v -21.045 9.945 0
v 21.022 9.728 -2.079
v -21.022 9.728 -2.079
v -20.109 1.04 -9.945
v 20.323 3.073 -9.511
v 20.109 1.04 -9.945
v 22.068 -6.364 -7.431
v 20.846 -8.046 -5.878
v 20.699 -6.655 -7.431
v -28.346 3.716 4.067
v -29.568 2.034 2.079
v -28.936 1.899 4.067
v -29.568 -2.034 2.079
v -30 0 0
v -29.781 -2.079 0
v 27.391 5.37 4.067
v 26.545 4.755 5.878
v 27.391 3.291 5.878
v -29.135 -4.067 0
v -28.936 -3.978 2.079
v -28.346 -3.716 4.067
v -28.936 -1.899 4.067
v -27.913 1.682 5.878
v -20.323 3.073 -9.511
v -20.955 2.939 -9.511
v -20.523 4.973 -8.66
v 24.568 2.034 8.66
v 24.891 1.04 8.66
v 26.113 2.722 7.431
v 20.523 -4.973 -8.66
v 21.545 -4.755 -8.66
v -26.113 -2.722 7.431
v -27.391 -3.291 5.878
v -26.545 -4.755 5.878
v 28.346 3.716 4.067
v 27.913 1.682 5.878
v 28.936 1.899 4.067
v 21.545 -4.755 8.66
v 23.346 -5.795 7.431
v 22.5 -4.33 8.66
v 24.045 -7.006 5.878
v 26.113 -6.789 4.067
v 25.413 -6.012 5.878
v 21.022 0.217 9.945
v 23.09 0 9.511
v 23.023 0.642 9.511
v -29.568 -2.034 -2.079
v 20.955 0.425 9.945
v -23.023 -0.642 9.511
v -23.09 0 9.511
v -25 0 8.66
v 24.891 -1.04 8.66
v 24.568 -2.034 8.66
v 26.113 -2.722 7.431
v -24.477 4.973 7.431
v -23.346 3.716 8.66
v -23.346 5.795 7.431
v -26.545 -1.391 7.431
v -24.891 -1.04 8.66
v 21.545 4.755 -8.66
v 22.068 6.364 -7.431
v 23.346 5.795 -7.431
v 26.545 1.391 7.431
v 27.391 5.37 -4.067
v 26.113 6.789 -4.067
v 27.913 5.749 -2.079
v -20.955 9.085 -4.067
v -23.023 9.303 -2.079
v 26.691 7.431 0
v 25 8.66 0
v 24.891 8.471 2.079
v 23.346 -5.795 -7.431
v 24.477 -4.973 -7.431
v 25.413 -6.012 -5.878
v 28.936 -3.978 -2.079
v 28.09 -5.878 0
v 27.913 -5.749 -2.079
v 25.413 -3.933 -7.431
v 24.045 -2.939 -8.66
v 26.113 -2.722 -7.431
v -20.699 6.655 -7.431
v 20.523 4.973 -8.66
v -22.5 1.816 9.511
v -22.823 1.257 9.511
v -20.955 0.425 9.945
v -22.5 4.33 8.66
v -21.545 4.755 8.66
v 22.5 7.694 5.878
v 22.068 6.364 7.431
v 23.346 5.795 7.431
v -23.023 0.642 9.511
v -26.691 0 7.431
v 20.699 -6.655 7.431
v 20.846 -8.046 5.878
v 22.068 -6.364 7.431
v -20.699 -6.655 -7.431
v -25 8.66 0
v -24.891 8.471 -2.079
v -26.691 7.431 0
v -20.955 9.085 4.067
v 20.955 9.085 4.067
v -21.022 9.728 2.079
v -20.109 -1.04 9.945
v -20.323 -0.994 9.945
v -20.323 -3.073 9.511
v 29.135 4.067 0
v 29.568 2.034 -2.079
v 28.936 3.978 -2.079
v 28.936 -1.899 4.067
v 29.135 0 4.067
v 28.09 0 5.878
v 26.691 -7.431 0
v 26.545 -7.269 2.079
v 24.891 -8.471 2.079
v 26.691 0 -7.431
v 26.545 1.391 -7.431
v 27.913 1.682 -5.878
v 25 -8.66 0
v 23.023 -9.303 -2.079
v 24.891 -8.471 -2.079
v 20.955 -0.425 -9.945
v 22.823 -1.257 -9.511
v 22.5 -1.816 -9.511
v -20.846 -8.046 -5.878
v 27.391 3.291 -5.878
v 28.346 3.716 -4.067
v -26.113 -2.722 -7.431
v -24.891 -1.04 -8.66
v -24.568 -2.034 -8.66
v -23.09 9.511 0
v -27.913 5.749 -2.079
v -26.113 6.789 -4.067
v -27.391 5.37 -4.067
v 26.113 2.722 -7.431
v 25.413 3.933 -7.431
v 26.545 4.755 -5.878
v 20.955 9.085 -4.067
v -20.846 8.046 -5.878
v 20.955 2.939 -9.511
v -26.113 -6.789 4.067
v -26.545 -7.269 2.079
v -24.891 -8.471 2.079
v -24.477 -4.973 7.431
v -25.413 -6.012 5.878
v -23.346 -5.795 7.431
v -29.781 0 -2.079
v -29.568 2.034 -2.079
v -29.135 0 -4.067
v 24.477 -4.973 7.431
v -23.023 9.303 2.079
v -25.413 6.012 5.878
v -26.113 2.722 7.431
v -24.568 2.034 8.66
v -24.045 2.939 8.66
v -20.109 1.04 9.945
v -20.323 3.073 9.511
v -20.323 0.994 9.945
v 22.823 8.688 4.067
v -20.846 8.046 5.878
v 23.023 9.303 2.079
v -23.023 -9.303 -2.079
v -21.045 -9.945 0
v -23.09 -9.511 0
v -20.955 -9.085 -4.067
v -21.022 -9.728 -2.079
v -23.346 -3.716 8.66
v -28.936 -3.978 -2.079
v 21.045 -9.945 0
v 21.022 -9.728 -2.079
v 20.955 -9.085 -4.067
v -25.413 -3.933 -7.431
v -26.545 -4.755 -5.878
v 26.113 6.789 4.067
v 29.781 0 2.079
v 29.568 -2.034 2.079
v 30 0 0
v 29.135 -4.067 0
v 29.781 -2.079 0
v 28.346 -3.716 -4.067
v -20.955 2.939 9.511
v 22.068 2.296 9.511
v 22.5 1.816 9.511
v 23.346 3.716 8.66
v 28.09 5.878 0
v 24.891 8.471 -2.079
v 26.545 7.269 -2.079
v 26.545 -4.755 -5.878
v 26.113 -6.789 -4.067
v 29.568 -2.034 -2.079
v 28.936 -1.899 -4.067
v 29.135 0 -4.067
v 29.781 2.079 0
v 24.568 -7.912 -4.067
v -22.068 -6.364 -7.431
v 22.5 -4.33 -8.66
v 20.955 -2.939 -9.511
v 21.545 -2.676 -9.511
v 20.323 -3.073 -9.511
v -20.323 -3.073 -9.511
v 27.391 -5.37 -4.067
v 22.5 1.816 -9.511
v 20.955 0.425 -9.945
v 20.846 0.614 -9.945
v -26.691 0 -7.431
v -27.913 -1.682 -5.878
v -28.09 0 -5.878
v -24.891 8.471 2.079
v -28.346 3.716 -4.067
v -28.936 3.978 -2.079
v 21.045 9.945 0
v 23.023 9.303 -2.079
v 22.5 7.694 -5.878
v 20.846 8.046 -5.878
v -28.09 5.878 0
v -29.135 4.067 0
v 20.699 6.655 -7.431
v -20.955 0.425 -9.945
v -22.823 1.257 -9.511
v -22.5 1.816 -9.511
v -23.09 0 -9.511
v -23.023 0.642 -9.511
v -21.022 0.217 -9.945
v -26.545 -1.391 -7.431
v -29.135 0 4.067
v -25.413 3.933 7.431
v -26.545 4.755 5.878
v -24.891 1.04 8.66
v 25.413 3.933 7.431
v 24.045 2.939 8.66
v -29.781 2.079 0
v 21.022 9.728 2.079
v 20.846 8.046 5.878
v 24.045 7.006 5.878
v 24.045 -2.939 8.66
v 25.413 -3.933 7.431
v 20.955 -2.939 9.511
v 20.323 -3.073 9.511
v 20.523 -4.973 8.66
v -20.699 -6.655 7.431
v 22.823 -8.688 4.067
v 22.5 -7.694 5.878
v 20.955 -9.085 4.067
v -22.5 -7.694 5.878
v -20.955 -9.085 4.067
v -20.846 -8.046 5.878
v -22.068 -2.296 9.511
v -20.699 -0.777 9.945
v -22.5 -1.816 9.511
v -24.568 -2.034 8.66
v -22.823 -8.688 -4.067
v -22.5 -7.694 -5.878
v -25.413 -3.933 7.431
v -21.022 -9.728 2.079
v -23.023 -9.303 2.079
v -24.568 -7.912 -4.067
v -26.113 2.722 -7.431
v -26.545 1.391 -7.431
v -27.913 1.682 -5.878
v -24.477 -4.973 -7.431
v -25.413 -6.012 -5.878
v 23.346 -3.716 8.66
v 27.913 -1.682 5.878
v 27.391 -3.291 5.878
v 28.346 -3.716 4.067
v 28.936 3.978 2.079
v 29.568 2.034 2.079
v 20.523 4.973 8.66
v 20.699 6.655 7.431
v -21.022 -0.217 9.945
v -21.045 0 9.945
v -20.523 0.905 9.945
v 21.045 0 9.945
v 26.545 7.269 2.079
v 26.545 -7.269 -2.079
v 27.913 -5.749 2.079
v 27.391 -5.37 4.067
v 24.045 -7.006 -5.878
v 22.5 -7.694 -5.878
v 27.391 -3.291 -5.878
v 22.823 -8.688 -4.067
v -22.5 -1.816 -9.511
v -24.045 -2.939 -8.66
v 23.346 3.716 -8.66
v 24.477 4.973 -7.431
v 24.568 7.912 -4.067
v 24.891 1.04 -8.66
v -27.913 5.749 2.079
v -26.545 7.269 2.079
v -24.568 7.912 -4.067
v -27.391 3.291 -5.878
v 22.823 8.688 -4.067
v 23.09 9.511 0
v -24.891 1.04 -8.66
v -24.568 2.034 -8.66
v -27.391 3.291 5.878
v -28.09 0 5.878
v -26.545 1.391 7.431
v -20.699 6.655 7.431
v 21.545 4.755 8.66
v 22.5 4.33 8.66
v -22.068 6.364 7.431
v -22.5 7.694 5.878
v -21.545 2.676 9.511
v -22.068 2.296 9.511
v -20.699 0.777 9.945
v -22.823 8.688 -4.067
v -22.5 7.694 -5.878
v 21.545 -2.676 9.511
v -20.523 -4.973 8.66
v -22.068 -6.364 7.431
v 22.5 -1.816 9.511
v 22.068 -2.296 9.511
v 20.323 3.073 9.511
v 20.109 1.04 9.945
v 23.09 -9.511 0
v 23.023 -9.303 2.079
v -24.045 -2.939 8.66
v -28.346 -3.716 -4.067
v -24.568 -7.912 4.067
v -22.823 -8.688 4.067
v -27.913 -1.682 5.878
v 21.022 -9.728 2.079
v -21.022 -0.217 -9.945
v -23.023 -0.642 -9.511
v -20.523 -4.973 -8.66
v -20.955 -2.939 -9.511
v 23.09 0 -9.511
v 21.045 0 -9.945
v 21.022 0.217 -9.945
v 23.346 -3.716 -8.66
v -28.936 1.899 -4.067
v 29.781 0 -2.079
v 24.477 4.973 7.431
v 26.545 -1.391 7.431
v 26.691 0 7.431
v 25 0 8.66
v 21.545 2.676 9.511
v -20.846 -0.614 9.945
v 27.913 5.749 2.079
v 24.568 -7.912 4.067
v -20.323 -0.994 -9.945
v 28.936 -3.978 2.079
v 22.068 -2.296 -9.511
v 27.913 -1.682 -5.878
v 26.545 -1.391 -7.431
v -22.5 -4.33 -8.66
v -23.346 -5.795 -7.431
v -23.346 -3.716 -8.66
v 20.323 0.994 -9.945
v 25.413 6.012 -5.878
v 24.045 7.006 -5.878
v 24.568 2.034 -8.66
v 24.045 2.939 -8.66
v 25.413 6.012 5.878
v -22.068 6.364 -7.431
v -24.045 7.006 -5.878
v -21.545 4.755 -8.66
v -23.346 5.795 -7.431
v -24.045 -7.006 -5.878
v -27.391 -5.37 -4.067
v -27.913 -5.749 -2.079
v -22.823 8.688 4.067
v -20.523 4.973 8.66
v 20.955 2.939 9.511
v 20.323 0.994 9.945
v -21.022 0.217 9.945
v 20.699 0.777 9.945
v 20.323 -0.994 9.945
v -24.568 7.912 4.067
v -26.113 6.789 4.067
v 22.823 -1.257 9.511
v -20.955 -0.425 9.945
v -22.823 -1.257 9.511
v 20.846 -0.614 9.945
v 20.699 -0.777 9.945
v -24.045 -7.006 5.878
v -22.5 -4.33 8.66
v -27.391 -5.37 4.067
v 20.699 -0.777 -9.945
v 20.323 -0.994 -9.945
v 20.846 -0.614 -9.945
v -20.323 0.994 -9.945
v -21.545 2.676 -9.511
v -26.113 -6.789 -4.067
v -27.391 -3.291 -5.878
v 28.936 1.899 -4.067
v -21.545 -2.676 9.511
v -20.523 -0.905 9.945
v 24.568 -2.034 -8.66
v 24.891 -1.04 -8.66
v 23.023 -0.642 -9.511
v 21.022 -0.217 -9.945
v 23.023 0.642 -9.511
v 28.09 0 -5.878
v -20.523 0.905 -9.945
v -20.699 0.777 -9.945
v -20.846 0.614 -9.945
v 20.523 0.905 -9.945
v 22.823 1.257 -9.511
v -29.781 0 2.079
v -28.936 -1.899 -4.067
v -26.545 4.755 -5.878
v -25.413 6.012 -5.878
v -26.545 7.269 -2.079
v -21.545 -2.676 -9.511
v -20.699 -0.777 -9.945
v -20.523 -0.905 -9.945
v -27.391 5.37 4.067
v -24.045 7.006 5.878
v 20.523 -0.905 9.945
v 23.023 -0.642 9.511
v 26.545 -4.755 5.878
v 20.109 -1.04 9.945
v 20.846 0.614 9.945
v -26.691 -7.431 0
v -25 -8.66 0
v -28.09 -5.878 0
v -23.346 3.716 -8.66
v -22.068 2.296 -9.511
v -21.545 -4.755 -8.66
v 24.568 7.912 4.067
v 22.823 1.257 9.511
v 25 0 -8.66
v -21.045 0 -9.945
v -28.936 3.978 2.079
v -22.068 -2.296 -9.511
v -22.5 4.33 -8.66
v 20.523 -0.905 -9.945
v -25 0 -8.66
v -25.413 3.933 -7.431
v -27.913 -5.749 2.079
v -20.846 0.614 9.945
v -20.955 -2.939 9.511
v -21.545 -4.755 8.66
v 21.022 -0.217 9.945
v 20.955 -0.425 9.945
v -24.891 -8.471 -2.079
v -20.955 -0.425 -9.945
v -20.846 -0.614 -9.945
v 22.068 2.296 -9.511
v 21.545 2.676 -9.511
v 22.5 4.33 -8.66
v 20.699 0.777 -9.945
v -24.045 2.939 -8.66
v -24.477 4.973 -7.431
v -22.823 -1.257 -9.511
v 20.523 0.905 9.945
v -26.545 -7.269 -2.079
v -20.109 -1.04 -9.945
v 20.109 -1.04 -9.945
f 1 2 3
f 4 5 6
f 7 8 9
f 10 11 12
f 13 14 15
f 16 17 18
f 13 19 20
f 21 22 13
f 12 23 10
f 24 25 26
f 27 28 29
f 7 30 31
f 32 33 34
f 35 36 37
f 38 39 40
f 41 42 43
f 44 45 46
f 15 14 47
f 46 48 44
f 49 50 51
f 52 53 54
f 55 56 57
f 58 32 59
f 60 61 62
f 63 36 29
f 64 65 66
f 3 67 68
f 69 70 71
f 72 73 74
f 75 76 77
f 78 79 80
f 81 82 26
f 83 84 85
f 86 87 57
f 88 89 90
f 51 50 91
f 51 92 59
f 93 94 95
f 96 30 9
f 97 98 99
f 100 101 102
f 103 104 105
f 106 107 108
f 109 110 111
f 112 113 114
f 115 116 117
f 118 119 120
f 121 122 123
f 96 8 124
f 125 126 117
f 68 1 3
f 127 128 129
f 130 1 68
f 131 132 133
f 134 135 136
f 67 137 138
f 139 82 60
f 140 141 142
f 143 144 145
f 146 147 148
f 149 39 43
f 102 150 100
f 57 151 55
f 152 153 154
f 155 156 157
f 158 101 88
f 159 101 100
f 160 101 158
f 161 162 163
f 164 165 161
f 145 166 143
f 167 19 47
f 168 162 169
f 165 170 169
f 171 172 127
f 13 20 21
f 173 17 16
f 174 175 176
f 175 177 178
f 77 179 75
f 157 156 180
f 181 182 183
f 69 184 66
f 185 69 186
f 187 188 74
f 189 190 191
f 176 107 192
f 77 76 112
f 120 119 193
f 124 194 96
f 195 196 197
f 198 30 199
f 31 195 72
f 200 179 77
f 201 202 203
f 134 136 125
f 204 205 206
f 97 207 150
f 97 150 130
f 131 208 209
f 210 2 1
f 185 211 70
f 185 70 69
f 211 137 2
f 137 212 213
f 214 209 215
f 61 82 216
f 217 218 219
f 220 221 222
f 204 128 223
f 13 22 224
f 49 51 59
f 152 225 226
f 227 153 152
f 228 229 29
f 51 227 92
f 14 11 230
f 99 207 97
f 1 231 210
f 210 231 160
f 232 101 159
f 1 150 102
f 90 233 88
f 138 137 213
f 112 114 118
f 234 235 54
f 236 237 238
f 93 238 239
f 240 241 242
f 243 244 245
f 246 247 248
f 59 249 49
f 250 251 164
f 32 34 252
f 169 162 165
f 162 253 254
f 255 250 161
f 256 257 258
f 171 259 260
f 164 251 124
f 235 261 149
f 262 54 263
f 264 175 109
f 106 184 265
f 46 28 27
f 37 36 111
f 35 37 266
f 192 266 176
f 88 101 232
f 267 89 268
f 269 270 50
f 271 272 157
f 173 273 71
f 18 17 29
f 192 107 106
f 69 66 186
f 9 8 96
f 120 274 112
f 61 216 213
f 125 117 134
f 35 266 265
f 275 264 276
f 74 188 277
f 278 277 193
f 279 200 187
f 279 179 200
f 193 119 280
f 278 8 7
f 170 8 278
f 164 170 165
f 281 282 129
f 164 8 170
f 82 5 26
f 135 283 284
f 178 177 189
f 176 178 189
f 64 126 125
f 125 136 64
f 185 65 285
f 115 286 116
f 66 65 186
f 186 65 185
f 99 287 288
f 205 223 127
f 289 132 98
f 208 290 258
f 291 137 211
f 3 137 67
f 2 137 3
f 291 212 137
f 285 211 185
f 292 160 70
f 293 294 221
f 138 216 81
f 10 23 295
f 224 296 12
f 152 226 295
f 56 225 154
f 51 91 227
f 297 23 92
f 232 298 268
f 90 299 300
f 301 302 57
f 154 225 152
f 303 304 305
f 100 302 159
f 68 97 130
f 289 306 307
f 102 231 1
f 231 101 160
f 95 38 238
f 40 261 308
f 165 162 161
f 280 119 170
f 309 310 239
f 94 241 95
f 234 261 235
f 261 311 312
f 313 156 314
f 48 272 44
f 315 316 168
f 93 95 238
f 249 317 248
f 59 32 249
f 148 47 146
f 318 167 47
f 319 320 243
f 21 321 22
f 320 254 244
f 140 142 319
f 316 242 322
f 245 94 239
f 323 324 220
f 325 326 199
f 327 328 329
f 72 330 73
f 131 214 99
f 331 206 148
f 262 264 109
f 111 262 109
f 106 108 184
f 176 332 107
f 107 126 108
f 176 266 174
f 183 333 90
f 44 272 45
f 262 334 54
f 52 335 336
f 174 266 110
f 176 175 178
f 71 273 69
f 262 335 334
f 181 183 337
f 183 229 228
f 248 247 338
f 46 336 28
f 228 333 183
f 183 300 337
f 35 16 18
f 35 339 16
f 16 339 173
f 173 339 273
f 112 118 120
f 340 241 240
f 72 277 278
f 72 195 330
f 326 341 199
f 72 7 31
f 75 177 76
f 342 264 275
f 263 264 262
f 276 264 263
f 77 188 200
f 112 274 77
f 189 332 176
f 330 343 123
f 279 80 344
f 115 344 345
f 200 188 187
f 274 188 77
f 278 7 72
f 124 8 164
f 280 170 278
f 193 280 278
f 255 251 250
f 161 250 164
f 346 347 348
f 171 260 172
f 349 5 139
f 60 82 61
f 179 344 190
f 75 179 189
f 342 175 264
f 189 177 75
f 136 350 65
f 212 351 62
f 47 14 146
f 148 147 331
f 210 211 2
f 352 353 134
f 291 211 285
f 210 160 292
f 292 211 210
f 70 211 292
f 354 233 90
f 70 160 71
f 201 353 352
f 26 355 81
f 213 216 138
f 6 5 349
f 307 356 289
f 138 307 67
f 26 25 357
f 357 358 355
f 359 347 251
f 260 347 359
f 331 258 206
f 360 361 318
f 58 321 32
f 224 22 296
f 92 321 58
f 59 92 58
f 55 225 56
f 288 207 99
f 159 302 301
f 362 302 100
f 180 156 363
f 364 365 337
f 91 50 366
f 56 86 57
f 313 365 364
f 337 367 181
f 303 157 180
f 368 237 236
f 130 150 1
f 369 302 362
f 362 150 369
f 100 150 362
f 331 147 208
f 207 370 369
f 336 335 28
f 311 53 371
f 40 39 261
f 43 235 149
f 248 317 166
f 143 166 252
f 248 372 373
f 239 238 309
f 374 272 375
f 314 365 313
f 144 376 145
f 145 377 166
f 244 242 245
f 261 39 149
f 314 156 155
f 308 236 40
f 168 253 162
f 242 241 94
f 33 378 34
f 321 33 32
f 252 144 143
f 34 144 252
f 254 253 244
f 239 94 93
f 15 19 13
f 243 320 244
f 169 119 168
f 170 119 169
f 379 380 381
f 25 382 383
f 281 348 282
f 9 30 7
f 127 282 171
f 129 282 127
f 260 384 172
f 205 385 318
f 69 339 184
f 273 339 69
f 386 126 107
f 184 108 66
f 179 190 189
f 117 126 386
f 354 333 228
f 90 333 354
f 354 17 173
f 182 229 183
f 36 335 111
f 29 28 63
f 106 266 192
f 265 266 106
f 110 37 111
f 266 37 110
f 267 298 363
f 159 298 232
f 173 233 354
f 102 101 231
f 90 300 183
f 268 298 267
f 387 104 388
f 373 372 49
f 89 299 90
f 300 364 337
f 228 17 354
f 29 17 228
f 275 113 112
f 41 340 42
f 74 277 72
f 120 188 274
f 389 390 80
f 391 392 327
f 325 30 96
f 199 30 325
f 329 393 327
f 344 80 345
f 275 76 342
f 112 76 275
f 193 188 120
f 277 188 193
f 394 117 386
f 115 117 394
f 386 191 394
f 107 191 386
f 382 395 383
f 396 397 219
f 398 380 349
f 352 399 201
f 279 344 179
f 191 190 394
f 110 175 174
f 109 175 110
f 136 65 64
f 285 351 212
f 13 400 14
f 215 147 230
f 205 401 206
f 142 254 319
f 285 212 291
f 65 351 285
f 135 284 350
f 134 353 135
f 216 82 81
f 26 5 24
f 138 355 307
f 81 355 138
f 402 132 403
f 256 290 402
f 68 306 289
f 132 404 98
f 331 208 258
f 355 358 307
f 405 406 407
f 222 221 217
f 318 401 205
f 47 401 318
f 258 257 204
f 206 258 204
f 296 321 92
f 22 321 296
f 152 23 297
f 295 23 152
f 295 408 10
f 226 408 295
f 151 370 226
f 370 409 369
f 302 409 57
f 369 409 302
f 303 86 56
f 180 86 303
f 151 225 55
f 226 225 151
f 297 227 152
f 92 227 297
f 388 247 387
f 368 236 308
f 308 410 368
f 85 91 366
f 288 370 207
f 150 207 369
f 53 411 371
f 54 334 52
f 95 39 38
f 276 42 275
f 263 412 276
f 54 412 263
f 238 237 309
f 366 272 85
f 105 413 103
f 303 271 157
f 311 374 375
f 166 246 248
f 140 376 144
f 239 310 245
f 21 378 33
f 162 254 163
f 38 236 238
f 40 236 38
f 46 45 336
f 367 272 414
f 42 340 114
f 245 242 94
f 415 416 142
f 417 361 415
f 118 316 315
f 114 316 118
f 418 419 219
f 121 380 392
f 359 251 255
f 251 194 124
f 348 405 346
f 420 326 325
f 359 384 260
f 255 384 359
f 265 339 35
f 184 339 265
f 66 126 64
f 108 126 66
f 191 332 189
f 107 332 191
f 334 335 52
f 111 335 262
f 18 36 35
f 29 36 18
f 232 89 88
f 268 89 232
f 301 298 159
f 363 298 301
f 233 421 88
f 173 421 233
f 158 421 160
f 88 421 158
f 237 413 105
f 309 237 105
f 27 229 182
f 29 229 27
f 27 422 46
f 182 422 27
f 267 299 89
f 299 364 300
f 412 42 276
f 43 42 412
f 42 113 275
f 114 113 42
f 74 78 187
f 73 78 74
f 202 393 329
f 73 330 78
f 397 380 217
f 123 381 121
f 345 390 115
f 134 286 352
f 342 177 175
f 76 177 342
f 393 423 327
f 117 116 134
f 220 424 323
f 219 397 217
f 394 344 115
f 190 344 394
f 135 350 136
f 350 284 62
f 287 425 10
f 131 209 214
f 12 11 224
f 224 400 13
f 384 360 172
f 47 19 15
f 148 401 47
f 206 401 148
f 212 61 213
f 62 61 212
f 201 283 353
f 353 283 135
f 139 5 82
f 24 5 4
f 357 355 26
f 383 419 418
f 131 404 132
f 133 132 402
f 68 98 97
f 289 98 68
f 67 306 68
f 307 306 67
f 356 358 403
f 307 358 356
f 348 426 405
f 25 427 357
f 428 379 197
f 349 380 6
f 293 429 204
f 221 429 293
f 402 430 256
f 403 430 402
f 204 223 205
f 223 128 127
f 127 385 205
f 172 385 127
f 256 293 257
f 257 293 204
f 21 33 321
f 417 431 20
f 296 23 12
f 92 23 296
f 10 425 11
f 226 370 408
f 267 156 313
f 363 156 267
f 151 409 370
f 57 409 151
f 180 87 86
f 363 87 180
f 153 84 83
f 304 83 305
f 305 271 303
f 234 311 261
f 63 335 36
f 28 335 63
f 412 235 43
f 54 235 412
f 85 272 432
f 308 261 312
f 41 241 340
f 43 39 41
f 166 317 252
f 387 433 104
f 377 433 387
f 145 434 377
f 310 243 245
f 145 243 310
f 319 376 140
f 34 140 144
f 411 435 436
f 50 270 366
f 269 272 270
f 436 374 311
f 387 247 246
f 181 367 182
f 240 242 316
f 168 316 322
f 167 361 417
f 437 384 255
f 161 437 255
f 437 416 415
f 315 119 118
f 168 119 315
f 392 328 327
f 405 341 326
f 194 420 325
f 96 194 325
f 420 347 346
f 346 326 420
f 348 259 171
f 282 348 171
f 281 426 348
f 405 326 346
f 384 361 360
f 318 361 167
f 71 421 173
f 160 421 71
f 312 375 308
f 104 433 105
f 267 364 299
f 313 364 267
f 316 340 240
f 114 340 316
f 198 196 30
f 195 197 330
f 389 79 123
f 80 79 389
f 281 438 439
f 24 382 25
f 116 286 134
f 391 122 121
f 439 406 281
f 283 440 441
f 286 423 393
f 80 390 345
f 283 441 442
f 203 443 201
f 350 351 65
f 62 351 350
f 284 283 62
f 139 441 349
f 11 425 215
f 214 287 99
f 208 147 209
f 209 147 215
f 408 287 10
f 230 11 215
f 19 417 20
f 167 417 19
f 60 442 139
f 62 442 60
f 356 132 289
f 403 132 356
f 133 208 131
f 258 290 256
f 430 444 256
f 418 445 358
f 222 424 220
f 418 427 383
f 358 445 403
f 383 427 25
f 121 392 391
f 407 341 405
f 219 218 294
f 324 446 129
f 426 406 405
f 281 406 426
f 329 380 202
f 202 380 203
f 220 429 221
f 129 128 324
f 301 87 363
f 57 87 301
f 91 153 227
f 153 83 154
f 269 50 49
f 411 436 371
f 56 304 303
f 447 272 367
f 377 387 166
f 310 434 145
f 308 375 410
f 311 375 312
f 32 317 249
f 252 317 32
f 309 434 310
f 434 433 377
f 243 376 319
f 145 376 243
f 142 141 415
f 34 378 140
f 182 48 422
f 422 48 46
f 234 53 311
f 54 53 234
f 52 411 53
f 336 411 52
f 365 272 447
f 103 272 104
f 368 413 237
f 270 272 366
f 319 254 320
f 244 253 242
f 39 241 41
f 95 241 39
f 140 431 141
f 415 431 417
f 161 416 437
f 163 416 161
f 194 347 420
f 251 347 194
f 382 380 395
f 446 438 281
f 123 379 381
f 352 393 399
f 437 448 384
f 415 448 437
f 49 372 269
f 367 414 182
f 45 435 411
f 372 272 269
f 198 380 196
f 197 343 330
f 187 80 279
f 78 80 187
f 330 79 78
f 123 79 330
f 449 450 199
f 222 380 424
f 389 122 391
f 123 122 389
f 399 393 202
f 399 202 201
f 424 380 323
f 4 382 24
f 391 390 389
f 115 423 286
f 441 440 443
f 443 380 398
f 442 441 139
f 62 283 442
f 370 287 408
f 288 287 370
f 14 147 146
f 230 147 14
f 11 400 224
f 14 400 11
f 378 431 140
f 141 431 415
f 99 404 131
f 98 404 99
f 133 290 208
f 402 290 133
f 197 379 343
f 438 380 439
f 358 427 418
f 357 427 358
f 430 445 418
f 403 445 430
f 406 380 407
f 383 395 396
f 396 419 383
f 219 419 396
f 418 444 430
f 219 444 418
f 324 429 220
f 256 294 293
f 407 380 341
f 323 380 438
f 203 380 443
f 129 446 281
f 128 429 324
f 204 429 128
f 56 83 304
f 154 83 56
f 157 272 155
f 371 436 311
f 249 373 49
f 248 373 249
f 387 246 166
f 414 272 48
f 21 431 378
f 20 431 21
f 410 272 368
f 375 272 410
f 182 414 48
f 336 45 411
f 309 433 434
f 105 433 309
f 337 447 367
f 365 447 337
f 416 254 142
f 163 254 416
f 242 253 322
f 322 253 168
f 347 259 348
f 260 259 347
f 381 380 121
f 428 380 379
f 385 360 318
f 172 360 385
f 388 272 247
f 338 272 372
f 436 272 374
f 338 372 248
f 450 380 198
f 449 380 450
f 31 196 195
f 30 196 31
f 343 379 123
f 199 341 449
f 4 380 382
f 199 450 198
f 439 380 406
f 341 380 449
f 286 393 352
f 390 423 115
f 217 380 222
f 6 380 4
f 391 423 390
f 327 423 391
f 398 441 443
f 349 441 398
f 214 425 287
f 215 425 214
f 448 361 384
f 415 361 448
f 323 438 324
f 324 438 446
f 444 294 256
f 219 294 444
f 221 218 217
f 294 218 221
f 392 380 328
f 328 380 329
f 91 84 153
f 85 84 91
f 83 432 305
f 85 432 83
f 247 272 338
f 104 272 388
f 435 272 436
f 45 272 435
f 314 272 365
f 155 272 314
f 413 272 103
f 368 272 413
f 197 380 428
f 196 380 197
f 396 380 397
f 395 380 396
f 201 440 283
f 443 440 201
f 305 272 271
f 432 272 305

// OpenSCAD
hull(){
    translate([-20,0,0])
        sphere(10);

    translate([20,0,0])
        sphere(10);
}
